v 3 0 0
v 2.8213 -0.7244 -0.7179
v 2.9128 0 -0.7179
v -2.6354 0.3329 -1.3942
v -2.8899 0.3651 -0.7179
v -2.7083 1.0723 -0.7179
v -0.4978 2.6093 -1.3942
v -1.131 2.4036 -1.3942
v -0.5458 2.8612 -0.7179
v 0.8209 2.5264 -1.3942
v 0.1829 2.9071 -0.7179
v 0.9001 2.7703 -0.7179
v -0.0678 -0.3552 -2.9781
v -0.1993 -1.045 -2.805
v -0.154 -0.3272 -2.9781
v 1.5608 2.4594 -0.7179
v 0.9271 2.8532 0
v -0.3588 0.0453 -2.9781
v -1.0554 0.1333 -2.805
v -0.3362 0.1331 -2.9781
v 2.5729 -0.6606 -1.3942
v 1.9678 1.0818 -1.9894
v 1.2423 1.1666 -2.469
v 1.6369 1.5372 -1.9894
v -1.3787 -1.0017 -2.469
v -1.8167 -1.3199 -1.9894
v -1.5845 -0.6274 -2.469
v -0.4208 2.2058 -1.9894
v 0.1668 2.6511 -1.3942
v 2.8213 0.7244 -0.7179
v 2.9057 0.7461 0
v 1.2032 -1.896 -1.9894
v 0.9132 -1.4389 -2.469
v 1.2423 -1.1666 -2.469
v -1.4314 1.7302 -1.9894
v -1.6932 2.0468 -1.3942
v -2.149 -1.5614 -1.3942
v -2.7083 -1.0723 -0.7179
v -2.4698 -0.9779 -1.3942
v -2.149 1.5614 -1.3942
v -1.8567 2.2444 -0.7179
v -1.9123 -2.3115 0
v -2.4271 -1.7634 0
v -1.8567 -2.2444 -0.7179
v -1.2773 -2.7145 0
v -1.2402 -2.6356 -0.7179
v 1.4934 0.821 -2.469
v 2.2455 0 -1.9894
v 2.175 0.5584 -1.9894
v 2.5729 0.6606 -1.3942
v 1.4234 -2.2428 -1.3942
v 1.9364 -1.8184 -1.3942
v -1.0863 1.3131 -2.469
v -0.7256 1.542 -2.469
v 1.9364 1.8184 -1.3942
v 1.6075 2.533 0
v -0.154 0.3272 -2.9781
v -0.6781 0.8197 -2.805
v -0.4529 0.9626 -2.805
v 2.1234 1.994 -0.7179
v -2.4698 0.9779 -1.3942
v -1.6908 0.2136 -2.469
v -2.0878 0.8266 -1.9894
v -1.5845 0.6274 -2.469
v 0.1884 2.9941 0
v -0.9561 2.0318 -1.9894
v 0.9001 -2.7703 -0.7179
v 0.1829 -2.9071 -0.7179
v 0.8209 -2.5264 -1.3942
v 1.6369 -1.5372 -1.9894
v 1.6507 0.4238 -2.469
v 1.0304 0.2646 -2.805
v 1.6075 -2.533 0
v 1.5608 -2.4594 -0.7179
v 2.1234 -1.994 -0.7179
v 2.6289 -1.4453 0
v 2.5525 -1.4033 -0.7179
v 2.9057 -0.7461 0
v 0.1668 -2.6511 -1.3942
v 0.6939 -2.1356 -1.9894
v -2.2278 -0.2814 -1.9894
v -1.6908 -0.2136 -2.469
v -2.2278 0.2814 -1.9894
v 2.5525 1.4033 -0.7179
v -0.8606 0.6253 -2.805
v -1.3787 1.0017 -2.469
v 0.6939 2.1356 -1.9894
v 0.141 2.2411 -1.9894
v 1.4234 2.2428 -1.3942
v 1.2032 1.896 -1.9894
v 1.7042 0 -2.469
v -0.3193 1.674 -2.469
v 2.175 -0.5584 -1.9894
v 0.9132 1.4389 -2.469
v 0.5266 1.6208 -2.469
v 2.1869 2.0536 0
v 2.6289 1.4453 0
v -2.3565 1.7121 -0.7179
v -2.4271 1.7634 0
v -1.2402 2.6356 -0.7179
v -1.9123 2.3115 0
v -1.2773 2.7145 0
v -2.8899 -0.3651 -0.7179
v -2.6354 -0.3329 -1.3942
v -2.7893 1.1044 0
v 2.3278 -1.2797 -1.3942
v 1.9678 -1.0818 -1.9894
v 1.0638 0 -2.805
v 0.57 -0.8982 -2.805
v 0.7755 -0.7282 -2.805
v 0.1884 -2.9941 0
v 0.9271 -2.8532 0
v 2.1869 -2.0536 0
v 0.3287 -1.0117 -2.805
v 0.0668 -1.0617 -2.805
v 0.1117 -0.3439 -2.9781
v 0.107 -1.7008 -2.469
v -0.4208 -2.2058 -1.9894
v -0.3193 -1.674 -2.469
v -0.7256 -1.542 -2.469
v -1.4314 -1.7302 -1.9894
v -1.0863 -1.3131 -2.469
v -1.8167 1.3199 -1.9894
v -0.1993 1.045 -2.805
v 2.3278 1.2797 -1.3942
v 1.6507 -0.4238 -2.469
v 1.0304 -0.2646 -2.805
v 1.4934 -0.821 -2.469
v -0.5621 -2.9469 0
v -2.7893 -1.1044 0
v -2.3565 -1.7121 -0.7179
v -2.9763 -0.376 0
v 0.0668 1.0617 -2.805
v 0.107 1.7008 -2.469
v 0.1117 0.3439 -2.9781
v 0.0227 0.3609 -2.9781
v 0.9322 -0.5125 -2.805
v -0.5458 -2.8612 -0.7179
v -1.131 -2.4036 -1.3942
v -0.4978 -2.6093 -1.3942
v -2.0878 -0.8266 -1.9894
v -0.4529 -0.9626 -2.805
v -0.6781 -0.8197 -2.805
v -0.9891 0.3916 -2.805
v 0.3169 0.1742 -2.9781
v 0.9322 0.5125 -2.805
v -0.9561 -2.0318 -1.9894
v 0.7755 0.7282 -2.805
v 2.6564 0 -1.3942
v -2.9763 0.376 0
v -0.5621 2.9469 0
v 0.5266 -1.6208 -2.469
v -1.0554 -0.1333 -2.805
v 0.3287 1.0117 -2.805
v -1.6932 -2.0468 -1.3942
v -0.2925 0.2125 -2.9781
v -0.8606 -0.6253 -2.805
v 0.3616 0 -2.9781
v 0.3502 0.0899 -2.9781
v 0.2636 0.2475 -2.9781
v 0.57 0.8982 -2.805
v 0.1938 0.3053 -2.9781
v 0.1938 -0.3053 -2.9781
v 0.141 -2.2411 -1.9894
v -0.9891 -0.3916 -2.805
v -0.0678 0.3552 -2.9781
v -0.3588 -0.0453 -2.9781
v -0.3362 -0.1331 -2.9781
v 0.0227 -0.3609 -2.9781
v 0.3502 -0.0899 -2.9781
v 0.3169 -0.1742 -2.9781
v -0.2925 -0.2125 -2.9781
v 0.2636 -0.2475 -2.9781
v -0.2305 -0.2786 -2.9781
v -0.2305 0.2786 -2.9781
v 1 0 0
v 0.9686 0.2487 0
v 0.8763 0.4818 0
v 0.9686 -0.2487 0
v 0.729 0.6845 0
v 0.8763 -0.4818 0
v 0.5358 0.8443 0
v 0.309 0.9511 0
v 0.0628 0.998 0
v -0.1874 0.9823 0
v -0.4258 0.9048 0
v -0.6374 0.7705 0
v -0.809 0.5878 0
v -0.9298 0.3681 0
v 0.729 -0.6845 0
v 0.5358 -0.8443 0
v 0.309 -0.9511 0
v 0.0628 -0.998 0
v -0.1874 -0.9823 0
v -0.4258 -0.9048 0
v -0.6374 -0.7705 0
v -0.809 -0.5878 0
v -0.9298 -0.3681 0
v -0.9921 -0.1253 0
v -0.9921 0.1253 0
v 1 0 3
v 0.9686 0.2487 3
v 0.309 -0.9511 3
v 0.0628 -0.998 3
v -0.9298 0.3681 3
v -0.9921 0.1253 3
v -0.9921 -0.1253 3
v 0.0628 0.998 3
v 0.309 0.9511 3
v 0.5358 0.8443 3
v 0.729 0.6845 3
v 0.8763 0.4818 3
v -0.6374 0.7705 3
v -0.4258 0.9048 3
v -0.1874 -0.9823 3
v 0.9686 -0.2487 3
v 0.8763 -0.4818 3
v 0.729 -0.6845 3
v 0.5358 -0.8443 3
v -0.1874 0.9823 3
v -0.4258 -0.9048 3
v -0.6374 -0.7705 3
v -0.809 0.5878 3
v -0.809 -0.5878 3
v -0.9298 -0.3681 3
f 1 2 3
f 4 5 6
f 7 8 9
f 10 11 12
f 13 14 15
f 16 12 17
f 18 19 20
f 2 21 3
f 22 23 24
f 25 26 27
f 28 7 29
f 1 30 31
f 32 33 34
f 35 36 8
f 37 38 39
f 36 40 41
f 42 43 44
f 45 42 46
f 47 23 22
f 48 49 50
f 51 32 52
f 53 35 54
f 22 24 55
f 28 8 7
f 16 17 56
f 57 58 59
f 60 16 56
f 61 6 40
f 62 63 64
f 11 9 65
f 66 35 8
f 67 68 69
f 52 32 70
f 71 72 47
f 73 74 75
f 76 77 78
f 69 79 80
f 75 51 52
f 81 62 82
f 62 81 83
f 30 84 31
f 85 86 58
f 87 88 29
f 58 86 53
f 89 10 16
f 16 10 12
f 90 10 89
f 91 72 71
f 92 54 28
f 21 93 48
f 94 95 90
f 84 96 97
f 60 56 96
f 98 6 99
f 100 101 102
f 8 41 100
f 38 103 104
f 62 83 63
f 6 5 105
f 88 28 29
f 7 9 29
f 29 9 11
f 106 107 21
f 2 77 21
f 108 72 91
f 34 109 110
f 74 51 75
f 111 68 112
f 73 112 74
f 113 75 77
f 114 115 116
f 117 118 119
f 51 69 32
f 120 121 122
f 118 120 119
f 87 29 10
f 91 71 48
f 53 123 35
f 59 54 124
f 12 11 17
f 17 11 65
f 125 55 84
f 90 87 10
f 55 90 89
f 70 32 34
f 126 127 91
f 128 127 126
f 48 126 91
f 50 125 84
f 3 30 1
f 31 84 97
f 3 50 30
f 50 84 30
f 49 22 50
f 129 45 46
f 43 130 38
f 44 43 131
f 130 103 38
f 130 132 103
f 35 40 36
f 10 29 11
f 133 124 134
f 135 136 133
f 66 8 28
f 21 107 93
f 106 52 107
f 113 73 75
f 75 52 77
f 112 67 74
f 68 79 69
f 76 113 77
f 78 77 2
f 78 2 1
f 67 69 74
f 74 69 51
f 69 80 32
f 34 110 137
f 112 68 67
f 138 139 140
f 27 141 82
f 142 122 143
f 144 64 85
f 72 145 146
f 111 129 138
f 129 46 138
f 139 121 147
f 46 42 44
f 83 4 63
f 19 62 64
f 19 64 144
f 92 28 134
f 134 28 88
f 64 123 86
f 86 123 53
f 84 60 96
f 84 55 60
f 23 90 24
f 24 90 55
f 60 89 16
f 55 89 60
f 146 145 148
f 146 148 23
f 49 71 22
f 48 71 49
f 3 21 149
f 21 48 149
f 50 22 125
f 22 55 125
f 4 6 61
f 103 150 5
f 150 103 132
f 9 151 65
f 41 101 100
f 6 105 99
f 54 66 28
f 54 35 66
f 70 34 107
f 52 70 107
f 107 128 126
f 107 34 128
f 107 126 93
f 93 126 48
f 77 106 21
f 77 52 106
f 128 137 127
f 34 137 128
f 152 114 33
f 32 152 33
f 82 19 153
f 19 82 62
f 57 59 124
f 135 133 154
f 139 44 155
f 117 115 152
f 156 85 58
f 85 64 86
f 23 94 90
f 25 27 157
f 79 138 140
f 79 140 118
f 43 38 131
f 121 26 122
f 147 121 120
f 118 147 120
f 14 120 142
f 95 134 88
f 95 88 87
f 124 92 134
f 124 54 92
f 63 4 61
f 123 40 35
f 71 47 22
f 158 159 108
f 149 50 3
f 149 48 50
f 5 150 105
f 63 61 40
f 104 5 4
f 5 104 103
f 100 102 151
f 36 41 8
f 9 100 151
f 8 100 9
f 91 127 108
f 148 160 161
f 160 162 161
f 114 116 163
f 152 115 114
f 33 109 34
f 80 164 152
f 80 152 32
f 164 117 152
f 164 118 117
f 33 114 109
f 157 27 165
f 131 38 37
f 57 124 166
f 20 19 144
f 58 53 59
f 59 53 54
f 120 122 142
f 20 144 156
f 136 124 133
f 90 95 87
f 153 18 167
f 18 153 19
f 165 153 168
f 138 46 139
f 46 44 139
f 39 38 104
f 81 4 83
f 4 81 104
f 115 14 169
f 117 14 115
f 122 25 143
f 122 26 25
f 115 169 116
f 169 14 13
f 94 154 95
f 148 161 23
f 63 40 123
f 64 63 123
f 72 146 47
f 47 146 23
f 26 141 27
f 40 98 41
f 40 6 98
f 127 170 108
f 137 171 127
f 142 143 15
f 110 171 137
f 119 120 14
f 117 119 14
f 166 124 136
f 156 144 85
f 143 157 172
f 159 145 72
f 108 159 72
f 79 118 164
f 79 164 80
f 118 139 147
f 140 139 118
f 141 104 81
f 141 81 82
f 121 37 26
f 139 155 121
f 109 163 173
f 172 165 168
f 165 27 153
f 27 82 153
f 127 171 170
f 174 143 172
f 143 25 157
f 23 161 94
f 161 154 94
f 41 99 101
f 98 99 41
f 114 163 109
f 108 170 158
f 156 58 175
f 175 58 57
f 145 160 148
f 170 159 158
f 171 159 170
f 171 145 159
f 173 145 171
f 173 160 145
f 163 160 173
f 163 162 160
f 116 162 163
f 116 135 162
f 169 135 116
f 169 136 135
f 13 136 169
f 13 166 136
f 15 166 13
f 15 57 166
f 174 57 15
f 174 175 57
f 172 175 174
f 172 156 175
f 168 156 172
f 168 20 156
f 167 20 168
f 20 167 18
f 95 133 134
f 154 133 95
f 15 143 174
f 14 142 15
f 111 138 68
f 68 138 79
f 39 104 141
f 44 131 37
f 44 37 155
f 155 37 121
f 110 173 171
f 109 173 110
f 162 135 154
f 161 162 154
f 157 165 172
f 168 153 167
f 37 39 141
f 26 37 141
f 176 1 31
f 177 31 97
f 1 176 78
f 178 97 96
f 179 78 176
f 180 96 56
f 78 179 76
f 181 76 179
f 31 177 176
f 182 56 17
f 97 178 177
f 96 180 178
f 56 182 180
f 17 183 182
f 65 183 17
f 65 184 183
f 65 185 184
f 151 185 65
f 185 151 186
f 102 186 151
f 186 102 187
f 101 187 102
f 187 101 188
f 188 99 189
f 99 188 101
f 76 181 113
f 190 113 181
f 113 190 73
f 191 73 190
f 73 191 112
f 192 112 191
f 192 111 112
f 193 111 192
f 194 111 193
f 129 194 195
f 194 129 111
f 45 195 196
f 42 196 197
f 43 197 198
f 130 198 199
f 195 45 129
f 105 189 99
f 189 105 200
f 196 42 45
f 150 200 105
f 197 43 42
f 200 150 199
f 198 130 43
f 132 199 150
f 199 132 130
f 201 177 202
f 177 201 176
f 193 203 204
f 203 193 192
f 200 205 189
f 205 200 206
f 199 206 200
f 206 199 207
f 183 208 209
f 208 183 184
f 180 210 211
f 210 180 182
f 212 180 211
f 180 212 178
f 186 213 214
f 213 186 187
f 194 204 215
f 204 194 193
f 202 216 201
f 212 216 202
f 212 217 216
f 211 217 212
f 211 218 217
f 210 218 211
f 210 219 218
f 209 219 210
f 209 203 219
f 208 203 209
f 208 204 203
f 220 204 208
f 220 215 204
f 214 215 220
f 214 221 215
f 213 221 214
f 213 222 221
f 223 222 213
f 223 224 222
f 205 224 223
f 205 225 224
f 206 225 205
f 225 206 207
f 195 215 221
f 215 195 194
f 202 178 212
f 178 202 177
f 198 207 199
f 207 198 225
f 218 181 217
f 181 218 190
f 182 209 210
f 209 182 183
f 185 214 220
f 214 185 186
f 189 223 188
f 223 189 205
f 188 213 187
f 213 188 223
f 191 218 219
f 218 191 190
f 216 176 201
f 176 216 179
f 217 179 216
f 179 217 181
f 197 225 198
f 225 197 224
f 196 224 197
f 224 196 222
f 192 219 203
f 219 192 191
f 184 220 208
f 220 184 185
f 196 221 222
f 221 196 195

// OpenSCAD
module bump(){
    difference(){
        $fn=25;
        sphere(3);
        translate([-5,-5,0]){
            cube([10,10,5]);
        }
    }
    $fn=25;
    cylinder(3,1,1);
}

bump();
